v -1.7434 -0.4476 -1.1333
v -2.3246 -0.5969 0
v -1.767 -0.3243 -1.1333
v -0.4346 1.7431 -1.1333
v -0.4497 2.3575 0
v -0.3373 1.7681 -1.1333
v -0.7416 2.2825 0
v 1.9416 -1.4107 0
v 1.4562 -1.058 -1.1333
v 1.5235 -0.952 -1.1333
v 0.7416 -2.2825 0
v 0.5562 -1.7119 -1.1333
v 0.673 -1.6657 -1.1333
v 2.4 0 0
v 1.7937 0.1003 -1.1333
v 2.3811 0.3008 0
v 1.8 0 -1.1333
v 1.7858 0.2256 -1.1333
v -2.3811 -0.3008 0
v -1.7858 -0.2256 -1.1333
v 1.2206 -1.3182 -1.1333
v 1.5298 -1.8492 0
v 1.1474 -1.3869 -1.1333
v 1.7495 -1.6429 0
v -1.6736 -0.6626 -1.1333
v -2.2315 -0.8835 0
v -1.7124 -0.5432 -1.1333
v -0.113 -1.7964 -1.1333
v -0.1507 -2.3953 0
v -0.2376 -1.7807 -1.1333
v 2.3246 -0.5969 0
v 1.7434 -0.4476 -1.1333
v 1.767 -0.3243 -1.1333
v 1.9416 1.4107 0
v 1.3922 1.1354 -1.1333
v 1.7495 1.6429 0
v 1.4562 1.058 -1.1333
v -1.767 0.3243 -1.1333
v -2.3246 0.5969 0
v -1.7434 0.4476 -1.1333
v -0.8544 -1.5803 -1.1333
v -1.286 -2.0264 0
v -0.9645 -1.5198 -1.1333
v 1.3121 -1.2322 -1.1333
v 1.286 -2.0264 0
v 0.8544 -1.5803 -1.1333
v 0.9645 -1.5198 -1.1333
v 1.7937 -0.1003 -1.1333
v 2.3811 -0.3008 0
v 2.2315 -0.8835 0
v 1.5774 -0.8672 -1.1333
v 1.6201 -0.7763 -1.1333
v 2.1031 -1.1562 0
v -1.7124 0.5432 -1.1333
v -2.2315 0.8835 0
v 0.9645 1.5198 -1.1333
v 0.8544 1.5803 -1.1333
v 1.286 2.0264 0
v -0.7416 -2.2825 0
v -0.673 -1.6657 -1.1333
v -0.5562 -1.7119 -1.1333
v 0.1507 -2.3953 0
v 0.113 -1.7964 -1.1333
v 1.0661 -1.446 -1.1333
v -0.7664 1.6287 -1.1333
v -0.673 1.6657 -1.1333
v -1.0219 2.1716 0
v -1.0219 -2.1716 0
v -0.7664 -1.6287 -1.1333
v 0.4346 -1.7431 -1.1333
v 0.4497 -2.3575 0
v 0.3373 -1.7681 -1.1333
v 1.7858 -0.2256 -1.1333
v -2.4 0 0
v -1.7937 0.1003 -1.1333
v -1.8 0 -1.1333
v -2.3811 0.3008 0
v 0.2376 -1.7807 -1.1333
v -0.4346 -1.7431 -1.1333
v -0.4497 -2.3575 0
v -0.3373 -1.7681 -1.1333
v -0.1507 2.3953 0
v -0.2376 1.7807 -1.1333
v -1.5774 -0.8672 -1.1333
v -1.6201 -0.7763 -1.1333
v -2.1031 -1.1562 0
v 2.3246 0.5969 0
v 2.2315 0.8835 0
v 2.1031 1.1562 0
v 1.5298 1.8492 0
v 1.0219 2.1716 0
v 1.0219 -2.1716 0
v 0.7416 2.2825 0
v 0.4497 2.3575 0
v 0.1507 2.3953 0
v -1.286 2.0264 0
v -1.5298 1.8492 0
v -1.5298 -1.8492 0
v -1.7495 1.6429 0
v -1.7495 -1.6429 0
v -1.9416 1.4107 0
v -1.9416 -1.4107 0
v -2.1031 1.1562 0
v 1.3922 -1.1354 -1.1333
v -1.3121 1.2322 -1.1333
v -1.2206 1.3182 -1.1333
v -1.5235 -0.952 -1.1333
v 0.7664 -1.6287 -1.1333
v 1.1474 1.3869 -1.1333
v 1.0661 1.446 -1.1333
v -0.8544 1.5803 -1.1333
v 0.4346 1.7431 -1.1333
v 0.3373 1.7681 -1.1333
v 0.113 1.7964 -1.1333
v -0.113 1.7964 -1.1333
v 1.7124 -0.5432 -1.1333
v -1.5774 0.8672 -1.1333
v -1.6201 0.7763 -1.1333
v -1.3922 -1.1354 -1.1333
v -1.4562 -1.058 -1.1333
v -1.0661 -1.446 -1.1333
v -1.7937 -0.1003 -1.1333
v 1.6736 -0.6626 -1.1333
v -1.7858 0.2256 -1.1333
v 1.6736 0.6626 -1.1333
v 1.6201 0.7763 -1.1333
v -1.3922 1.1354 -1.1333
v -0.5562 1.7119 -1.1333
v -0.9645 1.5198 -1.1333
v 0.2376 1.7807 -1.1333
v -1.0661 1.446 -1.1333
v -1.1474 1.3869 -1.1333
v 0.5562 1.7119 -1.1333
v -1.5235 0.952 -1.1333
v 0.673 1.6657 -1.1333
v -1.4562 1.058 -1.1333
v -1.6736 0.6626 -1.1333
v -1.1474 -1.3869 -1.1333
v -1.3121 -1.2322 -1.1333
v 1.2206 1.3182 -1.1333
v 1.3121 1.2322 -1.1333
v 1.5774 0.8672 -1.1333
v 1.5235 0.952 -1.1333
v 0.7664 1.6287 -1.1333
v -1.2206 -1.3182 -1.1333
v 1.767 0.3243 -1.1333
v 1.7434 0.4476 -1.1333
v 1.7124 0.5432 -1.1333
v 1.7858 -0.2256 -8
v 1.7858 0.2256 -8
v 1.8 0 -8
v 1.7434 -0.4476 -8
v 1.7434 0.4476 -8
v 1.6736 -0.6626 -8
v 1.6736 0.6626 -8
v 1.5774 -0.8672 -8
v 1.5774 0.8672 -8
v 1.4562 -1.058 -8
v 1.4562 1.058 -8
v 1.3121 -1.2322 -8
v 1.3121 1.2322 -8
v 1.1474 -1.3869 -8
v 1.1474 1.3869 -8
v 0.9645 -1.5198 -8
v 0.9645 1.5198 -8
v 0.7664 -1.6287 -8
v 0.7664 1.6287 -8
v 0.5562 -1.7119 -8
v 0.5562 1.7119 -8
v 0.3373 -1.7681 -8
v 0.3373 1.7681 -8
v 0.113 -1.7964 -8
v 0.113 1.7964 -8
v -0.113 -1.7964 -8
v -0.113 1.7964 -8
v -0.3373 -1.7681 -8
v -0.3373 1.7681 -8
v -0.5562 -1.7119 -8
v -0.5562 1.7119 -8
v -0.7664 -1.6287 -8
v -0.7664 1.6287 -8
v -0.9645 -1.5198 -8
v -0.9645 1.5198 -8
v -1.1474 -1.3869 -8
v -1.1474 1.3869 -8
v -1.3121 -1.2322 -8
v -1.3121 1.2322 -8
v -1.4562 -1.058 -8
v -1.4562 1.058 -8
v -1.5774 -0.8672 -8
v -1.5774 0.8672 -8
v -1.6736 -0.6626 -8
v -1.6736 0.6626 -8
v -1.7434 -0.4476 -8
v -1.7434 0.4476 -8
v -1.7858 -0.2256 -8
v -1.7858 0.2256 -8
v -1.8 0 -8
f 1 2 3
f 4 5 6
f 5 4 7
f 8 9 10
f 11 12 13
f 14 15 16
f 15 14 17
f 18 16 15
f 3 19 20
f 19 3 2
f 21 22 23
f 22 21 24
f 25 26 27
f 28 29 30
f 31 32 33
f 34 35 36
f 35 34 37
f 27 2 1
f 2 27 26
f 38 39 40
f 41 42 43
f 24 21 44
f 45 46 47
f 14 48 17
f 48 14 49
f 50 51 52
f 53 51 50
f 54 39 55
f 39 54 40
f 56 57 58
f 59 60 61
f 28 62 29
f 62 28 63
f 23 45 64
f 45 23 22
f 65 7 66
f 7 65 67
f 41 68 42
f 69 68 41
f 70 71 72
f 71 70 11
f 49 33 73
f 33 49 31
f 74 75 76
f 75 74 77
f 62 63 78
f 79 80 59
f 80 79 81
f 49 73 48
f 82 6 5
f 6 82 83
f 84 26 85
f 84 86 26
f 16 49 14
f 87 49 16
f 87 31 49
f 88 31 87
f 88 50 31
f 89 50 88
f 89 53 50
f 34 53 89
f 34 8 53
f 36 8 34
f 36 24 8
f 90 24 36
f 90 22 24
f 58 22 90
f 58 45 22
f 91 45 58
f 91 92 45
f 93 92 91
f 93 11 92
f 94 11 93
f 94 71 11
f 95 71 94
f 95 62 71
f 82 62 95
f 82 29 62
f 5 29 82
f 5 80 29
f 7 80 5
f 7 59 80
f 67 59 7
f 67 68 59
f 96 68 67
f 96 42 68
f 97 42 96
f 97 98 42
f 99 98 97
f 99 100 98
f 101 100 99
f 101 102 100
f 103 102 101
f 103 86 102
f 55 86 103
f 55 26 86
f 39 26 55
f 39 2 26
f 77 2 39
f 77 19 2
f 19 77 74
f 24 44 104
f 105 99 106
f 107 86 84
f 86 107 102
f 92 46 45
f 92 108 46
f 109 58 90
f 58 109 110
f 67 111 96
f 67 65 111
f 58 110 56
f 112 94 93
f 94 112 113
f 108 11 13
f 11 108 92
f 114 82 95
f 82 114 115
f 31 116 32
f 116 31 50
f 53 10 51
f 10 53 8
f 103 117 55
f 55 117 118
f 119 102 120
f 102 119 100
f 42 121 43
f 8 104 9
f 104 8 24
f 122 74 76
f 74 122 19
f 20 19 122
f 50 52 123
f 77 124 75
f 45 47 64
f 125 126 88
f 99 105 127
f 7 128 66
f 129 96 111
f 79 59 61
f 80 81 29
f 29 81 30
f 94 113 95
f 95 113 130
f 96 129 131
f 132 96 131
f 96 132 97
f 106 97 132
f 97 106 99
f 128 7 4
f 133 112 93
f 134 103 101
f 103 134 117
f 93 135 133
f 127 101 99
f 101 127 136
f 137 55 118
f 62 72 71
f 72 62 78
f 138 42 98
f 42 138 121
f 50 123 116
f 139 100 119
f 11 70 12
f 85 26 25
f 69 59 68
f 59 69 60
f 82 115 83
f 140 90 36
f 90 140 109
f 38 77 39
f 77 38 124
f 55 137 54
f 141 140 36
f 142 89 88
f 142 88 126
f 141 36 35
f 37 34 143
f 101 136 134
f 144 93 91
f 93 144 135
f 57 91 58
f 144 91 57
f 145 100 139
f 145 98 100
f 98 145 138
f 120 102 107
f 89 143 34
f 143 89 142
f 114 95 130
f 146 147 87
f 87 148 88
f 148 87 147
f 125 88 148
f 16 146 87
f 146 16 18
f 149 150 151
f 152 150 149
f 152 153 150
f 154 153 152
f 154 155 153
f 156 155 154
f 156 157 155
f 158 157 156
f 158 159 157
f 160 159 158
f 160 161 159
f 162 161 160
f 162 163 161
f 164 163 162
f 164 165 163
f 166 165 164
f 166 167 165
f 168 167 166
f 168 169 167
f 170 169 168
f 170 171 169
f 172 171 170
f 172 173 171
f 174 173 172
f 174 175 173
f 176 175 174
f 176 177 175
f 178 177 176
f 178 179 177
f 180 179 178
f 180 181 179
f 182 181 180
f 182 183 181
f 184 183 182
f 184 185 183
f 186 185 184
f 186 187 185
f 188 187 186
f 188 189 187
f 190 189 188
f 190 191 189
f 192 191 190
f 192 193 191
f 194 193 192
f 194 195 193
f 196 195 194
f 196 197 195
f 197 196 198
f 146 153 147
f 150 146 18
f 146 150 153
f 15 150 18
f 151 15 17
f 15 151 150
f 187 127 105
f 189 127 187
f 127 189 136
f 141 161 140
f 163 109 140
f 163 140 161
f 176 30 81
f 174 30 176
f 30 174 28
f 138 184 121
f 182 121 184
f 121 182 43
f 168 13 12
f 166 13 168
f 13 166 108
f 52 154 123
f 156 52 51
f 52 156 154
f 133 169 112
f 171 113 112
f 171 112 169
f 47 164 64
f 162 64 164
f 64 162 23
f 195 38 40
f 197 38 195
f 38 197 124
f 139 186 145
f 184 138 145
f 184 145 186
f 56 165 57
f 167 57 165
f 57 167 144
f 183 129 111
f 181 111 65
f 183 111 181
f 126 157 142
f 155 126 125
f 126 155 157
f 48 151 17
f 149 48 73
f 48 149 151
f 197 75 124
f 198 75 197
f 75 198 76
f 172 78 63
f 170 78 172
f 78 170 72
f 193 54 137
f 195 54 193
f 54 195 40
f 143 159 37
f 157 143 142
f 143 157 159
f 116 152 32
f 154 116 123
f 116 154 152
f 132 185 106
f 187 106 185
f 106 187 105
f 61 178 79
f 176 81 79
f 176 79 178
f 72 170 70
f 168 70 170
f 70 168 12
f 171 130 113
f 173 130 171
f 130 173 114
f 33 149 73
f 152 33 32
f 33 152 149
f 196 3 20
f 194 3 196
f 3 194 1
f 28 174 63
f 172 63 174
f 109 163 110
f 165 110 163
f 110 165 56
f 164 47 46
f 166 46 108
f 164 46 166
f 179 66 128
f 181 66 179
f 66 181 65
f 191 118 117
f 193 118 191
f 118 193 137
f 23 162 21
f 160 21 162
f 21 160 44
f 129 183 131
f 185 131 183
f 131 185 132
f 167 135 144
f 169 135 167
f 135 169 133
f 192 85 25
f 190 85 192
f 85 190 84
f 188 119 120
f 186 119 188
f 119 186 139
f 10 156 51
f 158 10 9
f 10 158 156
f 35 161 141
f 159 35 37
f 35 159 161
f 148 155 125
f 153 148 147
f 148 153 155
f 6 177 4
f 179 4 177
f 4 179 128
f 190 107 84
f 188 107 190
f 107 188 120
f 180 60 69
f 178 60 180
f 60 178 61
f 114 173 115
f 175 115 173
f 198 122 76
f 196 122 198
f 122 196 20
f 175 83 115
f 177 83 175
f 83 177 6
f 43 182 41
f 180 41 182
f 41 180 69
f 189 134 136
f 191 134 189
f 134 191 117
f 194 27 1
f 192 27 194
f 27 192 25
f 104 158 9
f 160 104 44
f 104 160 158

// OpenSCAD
$fn = 50;


difference() {
	union() {
		translate(v = [0, 0, 0]) {
			rotate(a = [0, 0, 0]) {
				difference() {
					union() {
						translate(v = [0, 0, -1.7000000000]) {
							cylinder(h = 1.7000000000, r1 = 1.5000000000, r2 = 2.4000000000);
						}
						translate(v = [0, 0, -8.0000000000]) {
							cylinder(h = 8, r = 1.5000000000);
						}
						translate(v = [0, 0, -8.0000000000]) {
							cylinder(h = 8, r = 1.8000000000);
						}
						translate(v = [0, 0, -8.0000000000]) {
							cylinder(h = 8, r = 1.5000000000);
						}
					}
					union();
				}
			}
		}
	}
	union();
}
